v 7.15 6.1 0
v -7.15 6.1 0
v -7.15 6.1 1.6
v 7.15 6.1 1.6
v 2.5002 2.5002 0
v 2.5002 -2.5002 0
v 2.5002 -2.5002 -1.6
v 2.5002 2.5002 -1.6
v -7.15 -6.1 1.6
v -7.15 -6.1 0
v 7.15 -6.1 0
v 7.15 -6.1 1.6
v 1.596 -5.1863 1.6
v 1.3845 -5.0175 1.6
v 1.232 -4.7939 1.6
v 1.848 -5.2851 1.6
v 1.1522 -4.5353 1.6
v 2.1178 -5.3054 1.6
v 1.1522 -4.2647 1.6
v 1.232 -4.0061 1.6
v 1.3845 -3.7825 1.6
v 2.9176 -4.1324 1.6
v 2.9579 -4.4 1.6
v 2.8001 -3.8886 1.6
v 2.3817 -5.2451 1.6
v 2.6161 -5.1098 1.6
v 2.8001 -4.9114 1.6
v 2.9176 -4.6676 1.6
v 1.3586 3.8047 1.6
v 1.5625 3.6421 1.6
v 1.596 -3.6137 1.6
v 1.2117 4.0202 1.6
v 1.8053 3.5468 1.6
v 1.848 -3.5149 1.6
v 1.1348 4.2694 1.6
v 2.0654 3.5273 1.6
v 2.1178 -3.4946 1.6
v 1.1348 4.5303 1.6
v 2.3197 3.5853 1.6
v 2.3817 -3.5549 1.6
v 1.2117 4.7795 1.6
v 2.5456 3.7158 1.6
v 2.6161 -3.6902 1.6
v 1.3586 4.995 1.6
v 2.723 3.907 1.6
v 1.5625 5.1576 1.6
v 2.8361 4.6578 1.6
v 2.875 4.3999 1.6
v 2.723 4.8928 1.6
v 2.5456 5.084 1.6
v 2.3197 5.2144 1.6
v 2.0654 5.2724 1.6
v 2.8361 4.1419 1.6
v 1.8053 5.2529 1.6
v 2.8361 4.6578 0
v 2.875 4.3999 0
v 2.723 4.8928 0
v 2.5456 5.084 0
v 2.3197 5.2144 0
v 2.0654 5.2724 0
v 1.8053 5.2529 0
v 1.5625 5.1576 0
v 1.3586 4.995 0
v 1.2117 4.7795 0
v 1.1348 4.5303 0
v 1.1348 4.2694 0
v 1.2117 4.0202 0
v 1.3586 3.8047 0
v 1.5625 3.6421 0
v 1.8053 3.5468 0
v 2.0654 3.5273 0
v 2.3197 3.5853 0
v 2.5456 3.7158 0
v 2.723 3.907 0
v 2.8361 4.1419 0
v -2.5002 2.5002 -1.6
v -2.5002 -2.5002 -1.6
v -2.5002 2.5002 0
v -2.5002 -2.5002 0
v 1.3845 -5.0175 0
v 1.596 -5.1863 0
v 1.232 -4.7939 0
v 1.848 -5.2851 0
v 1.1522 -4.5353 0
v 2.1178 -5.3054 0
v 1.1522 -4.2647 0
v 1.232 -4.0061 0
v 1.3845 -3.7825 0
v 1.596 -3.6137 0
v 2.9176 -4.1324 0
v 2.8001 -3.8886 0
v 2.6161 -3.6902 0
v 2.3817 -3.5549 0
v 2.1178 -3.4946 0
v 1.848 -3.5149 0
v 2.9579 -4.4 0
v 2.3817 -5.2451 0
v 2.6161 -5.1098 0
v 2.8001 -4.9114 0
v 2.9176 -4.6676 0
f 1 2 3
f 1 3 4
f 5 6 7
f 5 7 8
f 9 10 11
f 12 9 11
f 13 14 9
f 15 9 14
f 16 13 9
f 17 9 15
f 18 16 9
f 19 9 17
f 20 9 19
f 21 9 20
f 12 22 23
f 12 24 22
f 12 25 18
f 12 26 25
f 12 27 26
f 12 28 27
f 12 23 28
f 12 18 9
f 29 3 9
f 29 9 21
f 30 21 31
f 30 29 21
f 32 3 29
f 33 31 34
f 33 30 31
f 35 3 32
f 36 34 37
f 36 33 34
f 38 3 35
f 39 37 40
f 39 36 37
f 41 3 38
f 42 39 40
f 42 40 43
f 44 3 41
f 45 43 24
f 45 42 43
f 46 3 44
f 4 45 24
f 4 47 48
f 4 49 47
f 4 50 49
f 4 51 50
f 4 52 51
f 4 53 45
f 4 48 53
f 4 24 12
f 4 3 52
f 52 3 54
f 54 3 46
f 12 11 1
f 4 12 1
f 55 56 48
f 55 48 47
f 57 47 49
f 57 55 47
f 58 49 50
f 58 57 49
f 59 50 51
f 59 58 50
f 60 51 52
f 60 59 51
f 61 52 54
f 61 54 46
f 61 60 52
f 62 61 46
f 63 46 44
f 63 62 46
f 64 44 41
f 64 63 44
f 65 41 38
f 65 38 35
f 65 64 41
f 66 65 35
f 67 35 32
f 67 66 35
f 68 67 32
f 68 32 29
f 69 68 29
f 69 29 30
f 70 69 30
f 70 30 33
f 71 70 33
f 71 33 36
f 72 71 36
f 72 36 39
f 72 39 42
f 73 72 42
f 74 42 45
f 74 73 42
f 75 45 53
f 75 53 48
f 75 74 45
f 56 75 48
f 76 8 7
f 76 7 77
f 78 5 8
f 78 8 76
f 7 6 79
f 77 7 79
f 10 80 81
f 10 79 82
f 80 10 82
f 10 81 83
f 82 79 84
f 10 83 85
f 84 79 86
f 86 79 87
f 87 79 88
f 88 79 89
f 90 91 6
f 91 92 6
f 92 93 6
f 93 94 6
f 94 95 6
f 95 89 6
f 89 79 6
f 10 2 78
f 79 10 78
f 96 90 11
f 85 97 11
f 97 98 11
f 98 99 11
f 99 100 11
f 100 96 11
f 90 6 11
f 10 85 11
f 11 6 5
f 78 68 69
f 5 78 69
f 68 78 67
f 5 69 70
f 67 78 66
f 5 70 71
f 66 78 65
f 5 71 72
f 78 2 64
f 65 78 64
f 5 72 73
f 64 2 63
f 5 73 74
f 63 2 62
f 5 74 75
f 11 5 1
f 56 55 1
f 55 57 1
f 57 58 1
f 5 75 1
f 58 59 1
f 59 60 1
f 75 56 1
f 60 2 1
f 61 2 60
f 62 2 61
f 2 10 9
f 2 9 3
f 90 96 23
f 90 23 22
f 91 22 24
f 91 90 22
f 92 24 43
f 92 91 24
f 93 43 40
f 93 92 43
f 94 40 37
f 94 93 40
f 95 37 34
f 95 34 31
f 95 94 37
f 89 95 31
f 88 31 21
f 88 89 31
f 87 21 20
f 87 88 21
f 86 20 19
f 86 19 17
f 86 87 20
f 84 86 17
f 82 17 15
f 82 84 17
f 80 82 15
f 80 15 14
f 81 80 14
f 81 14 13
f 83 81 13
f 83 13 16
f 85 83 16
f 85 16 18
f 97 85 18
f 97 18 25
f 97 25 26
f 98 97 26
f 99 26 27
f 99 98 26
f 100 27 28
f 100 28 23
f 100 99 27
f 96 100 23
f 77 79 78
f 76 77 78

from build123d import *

# Parameters (mm, degrees)
SKETCH_1_W      = 14.3
SKETCH_1_H      = 12.2
SKETCH_1_R      = 0.875
SKETCH_1_R_2    = 0.907902719
EXTRUDE_1_DEPTH = 1.6
SKETCH_2_W      = 5.000412462
SKETCH_2_H      = 5.000412462
EXTRUDE_2_DEPTH = 1.6


with BuildPart() as part:
    # 草图1 → 凸台-拉伸1 (new body)
    with BuildSketch(Plane.XY):
        Rectangle(SKETCH_1_W, SKETCH_1_H)
        with Locations((2, 4.399857953)):
            Circle(SKETCH_1_R, mode=Mode.SUBTRACT)
        with Locations((2.05, -4.4)):
            Circle(SKETCH_1_R_2, mode=Mode.SUBTRACT)
    extrude(amount=EXTRUDE_1_DEPTH)

    # 草图2 → 凸台-拉伸2 (add)
    with BuildSketch(Plane(origin=(0, 0, 0), x_dir=(-1, 0, 0), z_dir=(0, 0, -1))):
        Rectangle(SKETCH_2_W, SKETCH_2_H)
    extrude(amount=EXTRUDE_2_DEPTH)


solid = part.part
